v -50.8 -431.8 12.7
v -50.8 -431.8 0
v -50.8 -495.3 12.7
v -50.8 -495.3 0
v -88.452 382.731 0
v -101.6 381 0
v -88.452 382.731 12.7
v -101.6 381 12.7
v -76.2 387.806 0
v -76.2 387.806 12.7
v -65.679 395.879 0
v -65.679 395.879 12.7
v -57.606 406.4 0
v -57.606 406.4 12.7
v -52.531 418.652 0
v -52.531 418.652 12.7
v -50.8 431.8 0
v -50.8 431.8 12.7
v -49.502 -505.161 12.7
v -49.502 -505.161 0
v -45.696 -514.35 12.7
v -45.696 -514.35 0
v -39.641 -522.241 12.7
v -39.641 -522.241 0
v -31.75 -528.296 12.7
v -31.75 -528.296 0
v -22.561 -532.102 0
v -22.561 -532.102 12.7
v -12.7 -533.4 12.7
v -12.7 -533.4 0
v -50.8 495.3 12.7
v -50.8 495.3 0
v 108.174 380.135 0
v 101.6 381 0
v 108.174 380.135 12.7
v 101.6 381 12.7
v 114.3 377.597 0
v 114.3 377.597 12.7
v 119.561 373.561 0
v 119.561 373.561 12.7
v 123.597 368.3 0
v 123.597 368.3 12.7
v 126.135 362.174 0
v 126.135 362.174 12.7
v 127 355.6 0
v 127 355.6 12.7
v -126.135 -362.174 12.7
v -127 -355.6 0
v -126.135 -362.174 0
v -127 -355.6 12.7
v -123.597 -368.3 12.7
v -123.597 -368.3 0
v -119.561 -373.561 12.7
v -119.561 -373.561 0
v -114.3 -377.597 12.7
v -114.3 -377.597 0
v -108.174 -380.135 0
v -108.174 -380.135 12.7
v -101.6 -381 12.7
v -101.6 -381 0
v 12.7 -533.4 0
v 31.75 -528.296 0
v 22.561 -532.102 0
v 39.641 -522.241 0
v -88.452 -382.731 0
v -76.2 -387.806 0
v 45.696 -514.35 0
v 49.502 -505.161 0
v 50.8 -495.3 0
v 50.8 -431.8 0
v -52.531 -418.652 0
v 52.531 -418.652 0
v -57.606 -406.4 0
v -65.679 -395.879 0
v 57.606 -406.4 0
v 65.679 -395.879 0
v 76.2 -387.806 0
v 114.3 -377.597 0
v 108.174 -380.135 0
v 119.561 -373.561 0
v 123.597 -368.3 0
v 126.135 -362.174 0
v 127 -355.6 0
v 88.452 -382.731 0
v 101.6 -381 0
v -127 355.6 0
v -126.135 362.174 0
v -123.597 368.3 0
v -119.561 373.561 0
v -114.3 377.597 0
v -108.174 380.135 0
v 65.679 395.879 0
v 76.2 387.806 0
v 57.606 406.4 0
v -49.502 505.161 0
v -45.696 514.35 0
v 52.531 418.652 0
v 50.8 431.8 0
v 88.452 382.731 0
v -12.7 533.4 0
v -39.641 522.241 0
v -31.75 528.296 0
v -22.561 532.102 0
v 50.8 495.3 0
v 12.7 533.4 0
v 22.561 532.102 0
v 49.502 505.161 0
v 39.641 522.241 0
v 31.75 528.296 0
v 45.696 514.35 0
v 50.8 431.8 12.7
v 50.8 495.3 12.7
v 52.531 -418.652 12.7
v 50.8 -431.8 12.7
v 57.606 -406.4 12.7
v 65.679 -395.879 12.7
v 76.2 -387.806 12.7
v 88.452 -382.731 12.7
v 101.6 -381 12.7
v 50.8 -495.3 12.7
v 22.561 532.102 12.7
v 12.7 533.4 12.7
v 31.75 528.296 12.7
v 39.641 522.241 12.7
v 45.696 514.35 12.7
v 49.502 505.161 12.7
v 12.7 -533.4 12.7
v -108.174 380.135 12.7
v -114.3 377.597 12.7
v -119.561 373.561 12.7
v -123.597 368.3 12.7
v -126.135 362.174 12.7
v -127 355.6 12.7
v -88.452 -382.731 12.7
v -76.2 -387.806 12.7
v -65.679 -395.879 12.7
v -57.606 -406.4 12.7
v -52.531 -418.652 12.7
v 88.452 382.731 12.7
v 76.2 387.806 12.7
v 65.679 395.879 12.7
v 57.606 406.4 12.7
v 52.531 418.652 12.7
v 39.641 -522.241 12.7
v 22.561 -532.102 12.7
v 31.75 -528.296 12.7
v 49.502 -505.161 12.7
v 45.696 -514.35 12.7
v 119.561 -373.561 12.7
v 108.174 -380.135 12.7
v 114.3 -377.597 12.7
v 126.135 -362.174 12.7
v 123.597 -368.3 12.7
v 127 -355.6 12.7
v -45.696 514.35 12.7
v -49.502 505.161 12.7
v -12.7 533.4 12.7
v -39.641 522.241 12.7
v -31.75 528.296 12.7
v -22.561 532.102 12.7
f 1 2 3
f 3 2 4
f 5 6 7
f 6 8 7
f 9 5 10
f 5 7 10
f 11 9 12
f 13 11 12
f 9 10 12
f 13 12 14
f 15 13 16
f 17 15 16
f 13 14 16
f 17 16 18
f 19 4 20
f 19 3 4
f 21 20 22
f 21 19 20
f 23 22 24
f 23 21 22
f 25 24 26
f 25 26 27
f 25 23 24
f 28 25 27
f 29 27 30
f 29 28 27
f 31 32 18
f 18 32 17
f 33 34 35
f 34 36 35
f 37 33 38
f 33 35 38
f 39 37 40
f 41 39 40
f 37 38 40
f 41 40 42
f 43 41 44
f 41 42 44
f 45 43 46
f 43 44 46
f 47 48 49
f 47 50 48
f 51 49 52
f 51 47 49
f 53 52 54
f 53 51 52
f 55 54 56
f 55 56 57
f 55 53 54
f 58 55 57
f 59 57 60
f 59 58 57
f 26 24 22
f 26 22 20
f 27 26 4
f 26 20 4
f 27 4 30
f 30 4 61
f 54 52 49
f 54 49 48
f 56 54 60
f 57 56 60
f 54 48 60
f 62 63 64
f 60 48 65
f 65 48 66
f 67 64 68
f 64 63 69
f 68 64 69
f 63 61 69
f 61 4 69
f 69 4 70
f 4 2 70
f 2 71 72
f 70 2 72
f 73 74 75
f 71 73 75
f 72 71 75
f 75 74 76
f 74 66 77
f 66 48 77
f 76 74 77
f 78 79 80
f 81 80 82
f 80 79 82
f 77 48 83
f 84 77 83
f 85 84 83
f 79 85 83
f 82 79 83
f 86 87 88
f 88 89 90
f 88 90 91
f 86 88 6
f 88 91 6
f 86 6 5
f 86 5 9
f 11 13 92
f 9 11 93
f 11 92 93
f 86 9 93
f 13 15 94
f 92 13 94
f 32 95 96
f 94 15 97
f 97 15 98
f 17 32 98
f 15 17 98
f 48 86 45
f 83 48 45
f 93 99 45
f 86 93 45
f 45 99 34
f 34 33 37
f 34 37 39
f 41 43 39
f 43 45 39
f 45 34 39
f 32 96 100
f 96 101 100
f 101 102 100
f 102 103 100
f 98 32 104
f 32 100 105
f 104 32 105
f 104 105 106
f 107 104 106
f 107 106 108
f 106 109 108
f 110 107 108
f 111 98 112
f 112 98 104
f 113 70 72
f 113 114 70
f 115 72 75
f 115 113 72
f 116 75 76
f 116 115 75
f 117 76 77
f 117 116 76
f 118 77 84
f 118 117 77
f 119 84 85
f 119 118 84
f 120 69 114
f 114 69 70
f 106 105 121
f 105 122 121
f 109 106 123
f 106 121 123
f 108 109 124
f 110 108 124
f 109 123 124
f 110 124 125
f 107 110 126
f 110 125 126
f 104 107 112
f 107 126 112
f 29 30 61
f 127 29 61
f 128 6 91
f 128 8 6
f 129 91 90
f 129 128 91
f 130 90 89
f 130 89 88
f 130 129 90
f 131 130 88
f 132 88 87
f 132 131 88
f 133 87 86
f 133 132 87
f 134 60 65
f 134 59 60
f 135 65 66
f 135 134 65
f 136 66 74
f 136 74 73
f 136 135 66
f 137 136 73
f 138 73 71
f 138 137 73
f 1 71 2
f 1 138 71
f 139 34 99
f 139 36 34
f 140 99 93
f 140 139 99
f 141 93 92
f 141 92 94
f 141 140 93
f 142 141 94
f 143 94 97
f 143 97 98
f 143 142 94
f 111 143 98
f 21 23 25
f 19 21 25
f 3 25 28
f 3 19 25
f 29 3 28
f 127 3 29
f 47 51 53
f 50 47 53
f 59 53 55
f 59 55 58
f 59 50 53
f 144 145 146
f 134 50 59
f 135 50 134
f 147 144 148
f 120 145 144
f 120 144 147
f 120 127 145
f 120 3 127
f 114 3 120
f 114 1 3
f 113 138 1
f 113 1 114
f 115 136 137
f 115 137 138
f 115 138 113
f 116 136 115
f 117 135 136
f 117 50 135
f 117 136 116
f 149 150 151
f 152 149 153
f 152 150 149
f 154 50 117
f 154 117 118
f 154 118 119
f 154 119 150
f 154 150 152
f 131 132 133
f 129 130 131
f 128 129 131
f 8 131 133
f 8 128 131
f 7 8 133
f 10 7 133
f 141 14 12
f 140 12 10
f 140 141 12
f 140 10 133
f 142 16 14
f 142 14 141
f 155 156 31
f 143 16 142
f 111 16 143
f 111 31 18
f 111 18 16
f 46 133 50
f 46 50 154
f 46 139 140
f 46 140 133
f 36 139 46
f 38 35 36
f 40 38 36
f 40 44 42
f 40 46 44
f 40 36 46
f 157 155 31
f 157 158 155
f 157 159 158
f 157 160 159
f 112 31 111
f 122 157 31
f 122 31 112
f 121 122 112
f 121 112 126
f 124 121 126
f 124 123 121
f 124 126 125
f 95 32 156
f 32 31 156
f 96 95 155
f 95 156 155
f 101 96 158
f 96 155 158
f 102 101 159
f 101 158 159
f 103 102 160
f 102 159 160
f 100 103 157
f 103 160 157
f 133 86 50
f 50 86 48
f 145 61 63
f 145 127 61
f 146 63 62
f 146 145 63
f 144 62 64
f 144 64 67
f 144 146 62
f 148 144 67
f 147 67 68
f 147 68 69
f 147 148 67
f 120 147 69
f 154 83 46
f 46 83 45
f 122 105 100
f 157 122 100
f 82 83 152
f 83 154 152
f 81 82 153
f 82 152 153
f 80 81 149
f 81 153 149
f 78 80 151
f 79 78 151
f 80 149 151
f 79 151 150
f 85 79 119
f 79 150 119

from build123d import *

# Parameters (mm, degrees)
F1_DEPTH = 12.7
F2_R     = 50.8
F3_R     = 38.1
F4_R     = 25.39999


# Not quite as in the source:
# - a fillet or chamfer is up to 0.001 mm smaller than in the source, because OpenCascade refuses the exact size


with BuildPart() as f1:
    # F0 (on Top) → F1 (new body)
    with BuildSketch(Plane.XY):
        Polygon((-50.8, 381), (-127, 381), (-127, 0), (-127, -381), (-50.8, -381), (-50.8, -533.4), (50.8, -533.4), (50.8, -381), (127, -381), (127, 0), (127, 381), (50.8, 381), (50.8, 533.4), (-50.8, 533.4), align=None)
    extrude(amount=F1_DEPTH)

    # F2
    f2_edges = [f1.edges().sort_by_distance(p)[0] for p in [
        (-50.8, 381, 6.35),
        (50.8, 381, 6.35),
        (-50.8, -381, 6.35),
        (50.8, -381, 6.35),
    ]]
    fillet(f2_edges, radius=F2_R)

    # F3
    f3_edges = [f1.edges().sort_by_distance(p)[0] for p in [
        (-50.8, 533.4, 6.35),
        (50.8, 533.4, 6.35),
        (-50.8, -533.4, 6.35),
        (50.8, -533.4, 6.35),
    ]]
    fillet(f3_edges, radius=F3_R)

    # F4 (radius 25.4 in the source; OpenCascade refuses exactly that, so slightly less here)
    f4_edges = [f1.edges().sort_by_distance(p)[0] for p in [
        (-127, 381, 6.35),
        (127, 381, 6.35),
        (127, -381, 6.35),
        (-127, -381, 6.35),
    ]]
    fillet(f4_edges, radius=F4_R)


solid = f1.part
